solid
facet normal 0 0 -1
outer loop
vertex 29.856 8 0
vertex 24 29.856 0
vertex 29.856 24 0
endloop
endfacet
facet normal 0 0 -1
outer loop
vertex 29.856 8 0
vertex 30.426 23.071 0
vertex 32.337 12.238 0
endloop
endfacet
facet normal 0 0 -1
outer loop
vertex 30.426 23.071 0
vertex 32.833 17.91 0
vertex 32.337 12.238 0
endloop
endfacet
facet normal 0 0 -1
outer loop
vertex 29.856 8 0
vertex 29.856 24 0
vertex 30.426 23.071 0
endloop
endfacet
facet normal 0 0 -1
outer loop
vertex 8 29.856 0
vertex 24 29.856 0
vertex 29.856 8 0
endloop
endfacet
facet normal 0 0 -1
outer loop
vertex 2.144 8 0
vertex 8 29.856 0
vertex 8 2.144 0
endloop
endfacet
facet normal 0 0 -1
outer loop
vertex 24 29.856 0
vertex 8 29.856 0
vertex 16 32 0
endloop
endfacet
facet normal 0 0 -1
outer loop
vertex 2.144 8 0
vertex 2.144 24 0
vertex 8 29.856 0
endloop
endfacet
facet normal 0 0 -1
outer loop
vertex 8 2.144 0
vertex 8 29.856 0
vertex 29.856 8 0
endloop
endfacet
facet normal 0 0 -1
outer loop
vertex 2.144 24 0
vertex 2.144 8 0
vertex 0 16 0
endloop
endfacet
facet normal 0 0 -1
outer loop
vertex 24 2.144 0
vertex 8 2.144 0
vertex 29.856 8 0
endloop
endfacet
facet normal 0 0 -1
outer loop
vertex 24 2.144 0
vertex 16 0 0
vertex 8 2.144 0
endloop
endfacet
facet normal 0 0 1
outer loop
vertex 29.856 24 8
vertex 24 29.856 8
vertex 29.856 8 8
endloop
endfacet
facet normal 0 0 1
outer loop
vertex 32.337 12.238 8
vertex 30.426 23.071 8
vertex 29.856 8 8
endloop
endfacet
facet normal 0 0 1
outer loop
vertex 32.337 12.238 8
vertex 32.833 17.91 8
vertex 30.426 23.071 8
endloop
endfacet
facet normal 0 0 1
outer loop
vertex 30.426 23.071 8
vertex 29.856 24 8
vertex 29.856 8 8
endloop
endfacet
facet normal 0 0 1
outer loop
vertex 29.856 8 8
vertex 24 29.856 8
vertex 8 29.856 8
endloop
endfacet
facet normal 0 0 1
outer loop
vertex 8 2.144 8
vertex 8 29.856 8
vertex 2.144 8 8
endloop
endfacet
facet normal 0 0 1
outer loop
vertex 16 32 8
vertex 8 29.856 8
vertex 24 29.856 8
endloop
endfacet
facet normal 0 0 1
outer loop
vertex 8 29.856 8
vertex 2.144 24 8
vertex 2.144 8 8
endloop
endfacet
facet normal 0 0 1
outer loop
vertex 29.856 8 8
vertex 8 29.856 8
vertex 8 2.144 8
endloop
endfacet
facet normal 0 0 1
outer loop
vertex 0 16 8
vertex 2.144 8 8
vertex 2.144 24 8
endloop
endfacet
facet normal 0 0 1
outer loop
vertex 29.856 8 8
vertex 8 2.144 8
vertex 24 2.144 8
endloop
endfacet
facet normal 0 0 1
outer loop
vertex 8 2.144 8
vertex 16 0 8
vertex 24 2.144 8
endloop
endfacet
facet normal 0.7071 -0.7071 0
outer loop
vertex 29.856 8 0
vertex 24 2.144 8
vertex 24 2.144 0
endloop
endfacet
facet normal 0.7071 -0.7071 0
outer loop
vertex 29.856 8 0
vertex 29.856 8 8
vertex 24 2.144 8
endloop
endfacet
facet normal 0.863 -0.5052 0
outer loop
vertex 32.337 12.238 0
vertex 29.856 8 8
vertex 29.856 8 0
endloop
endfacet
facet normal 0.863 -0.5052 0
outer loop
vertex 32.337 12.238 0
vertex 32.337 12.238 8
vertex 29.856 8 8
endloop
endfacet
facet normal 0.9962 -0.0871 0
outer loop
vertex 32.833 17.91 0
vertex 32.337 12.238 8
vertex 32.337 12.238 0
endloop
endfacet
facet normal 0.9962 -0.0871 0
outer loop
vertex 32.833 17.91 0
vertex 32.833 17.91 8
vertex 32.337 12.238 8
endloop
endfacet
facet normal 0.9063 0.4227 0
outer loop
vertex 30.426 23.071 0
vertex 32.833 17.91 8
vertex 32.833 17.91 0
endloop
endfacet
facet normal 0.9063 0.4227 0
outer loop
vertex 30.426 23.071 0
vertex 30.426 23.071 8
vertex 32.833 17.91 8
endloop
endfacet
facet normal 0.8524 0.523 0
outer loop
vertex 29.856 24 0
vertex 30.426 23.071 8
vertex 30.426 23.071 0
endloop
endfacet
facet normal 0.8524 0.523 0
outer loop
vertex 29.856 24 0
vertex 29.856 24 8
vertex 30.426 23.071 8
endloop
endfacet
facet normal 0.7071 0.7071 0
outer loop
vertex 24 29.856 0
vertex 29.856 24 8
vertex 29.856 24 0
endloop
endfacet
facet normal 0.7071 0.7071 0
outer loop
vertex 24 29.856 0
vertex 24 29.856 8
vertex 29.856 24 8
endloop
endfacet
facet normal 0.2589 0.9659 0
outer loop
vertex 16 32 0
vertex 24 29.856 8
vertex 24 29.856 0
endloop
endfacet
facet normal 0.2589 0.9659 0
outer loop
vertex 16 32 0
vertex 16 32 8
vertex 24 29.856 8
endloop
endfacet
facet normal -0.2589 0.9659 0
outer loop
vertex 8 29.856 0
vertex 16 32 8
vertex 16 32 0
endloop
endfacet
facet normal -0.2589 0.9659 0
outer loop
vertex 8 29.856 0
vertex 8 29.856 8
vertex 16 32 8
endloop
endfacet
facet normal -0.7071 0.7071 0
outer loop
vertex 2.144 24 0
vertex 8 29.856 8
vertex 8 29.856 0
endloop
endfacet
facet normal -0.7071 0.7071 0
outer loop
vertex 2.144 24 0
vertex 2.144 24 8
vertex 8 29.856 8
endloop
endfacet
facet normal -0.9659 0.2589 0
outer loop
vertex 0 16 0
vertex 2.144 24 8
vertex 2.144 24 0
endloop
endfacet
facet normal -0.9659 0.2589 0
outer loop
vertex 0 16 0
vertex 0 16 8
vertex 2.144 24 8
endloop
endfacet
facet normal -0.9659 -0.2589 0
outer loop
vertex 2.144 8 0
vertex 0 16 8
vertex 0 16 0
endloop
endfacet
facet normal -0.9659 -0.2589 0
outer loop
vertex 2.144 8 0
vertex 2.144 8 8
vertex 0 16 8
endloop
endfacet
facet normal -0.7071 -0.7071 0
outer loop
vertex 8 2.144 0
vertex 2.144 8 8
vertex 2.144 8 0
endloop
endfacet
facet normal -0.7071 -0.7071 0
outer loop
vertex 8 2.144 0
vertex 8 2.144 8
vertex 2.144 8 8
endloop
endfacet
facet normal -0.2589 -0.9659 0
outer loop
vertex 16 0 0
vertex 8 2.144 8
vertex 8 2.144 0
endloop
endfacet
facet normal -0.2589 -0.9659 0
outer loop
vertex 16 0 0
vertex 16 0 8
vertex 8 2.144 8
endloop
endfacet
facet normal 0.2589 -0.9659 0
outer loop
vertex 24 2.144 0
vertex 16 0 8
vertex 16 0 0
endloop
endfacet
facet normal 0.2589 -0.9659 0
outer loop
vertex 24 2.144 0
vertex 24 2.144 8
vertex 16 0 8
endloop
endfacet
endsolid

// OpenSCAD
$fn = 32;

// ----------------------------------------------------------------------
// Eccentric disc: egg, 8 mm thick
// ----------------------------------------------------------------------

// --- parameters (mm) ---
profile_height = 8;       // extrusion height
profile_points = 14;      // points of the closed outline

profile = [[0, 16], [2.144, 8], [8, 2.144], [16, 0], [24, 2.144], [29.856, 8], [32.337, 12.238], [32.833, 17.91], [30.426, 23.071], [29.856, 24], [24, 29.856], [16, 32], [8, 29.856], [2.144, 24]];  // single closed polygon, 14 points, counter clockwise

// --- the one profile operation ---
linear_extrude(height = profile_height) polygon(points = profile);
